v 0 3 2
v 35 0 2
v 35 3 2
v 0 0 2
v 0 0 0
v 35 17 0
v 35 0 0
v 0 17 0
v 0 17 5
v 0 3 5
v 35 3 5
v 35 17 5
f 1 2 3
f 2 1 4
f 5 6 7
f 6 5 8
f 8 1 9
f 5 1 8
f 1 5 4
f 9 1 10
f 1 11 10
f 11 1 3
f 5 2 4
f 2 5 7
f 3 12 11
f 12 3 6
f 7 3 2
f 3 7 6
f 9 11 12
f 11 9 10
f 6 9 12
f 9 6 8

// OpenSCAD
translate([2.5, 1.5, 1.0]) color([0.04523406786561235, 0.5738660367891669, 0.9100160146990397]) cube([5, 3, 2], center=true);
translate([7.5, 1.5, 1.0]) color([0.534197968260724, 0.6805891325622565, 0.026696794662205203]) cube([5, 3, 2], center=true);
translate([12.5, 1.5, 1.0]) color([0.6349999099114583, 0.6063384177542189, 0.5759529480315407]) cube([5, 3, 2], center=true);
translate([17.5, 1.5, 1.0]) color([0.3912094093228269, 0.3701399403351875, 0.9805166506472687]) cube([5, 3, 2], center=true);
translate([22.5, 1.5, 1.0]) color([0.036392037611485795, 0.021636509855024078, 0.9610312802396112]) cube([5, 3, 2], center=true);
translate([27.5, 1.5, 1.0]) color([0.18497194139743833, 0.12389516442443171, 0.21057650988664645]) cube([5, 3, 2], center=true);
translate([32.5, 1.5, 1.0]) color([0.8007465903541809, 0.9369691586445807, 0.022782575668658378]) cube([5, 3, 2], center=true);
translate([3.5, 6.5, 2.5]) color([0.42561883196681716, 0.10150021937416975, 0.259919889792832]) cube([7, 7, 5], center=true);
translate([10.5, 6.5, 2.5]) color([0.22082927131631735, 0.6469257198353225, 0.3502939673965323]) cube([7, 7, 5], center=true);
translate([17.5, 6.5, 2.5]) color([0.18031790152968785, 0.5036365052098872, 0.03937870708469238]) cube([7, 7, 5], center=true);
translate([24.5, 6.5, 2.5]) color([0.10092124118896661, 0.9882351487225011, 0.19935579046706298]) cube([7, 7, 5], center=true);
translate([31.5, 6.5, 2.5]) color([0.35855530131160185, 0.7315983062253606, 0.8383265651934163]) cube([7, 7, 5], center=true);
translate([3.5, 13.5, 2.5]) color([0.9184820619953314, 0.16942460609746768, 0.6726405635730526]) cube([7, 7, 5], center=true);
translate([10.5, 13.5, 2.5]) color([0.9665489030431832, 0.05805094382649867, 0.6762017842993783]) cube([7, 7, 5], center=true);
translate([17.5, 13.5, 2.5]) color([0.8454245937016164, 0.342312541078584, 0.25068733928511167]) cube([7, 7, 5], center=true);
translate([24.5, 13.5, 2.5]) color([0.596791393469411, 0.44231403369907896, 0.17481948445144113]) cube([7, 7, 5], center=true);
translate([31.5, 13.5, 2.5]) color([0.47162541509628797, 0.40990539565755457, 0.5691127395242802]) cube([7, 7, 5], center=true);
